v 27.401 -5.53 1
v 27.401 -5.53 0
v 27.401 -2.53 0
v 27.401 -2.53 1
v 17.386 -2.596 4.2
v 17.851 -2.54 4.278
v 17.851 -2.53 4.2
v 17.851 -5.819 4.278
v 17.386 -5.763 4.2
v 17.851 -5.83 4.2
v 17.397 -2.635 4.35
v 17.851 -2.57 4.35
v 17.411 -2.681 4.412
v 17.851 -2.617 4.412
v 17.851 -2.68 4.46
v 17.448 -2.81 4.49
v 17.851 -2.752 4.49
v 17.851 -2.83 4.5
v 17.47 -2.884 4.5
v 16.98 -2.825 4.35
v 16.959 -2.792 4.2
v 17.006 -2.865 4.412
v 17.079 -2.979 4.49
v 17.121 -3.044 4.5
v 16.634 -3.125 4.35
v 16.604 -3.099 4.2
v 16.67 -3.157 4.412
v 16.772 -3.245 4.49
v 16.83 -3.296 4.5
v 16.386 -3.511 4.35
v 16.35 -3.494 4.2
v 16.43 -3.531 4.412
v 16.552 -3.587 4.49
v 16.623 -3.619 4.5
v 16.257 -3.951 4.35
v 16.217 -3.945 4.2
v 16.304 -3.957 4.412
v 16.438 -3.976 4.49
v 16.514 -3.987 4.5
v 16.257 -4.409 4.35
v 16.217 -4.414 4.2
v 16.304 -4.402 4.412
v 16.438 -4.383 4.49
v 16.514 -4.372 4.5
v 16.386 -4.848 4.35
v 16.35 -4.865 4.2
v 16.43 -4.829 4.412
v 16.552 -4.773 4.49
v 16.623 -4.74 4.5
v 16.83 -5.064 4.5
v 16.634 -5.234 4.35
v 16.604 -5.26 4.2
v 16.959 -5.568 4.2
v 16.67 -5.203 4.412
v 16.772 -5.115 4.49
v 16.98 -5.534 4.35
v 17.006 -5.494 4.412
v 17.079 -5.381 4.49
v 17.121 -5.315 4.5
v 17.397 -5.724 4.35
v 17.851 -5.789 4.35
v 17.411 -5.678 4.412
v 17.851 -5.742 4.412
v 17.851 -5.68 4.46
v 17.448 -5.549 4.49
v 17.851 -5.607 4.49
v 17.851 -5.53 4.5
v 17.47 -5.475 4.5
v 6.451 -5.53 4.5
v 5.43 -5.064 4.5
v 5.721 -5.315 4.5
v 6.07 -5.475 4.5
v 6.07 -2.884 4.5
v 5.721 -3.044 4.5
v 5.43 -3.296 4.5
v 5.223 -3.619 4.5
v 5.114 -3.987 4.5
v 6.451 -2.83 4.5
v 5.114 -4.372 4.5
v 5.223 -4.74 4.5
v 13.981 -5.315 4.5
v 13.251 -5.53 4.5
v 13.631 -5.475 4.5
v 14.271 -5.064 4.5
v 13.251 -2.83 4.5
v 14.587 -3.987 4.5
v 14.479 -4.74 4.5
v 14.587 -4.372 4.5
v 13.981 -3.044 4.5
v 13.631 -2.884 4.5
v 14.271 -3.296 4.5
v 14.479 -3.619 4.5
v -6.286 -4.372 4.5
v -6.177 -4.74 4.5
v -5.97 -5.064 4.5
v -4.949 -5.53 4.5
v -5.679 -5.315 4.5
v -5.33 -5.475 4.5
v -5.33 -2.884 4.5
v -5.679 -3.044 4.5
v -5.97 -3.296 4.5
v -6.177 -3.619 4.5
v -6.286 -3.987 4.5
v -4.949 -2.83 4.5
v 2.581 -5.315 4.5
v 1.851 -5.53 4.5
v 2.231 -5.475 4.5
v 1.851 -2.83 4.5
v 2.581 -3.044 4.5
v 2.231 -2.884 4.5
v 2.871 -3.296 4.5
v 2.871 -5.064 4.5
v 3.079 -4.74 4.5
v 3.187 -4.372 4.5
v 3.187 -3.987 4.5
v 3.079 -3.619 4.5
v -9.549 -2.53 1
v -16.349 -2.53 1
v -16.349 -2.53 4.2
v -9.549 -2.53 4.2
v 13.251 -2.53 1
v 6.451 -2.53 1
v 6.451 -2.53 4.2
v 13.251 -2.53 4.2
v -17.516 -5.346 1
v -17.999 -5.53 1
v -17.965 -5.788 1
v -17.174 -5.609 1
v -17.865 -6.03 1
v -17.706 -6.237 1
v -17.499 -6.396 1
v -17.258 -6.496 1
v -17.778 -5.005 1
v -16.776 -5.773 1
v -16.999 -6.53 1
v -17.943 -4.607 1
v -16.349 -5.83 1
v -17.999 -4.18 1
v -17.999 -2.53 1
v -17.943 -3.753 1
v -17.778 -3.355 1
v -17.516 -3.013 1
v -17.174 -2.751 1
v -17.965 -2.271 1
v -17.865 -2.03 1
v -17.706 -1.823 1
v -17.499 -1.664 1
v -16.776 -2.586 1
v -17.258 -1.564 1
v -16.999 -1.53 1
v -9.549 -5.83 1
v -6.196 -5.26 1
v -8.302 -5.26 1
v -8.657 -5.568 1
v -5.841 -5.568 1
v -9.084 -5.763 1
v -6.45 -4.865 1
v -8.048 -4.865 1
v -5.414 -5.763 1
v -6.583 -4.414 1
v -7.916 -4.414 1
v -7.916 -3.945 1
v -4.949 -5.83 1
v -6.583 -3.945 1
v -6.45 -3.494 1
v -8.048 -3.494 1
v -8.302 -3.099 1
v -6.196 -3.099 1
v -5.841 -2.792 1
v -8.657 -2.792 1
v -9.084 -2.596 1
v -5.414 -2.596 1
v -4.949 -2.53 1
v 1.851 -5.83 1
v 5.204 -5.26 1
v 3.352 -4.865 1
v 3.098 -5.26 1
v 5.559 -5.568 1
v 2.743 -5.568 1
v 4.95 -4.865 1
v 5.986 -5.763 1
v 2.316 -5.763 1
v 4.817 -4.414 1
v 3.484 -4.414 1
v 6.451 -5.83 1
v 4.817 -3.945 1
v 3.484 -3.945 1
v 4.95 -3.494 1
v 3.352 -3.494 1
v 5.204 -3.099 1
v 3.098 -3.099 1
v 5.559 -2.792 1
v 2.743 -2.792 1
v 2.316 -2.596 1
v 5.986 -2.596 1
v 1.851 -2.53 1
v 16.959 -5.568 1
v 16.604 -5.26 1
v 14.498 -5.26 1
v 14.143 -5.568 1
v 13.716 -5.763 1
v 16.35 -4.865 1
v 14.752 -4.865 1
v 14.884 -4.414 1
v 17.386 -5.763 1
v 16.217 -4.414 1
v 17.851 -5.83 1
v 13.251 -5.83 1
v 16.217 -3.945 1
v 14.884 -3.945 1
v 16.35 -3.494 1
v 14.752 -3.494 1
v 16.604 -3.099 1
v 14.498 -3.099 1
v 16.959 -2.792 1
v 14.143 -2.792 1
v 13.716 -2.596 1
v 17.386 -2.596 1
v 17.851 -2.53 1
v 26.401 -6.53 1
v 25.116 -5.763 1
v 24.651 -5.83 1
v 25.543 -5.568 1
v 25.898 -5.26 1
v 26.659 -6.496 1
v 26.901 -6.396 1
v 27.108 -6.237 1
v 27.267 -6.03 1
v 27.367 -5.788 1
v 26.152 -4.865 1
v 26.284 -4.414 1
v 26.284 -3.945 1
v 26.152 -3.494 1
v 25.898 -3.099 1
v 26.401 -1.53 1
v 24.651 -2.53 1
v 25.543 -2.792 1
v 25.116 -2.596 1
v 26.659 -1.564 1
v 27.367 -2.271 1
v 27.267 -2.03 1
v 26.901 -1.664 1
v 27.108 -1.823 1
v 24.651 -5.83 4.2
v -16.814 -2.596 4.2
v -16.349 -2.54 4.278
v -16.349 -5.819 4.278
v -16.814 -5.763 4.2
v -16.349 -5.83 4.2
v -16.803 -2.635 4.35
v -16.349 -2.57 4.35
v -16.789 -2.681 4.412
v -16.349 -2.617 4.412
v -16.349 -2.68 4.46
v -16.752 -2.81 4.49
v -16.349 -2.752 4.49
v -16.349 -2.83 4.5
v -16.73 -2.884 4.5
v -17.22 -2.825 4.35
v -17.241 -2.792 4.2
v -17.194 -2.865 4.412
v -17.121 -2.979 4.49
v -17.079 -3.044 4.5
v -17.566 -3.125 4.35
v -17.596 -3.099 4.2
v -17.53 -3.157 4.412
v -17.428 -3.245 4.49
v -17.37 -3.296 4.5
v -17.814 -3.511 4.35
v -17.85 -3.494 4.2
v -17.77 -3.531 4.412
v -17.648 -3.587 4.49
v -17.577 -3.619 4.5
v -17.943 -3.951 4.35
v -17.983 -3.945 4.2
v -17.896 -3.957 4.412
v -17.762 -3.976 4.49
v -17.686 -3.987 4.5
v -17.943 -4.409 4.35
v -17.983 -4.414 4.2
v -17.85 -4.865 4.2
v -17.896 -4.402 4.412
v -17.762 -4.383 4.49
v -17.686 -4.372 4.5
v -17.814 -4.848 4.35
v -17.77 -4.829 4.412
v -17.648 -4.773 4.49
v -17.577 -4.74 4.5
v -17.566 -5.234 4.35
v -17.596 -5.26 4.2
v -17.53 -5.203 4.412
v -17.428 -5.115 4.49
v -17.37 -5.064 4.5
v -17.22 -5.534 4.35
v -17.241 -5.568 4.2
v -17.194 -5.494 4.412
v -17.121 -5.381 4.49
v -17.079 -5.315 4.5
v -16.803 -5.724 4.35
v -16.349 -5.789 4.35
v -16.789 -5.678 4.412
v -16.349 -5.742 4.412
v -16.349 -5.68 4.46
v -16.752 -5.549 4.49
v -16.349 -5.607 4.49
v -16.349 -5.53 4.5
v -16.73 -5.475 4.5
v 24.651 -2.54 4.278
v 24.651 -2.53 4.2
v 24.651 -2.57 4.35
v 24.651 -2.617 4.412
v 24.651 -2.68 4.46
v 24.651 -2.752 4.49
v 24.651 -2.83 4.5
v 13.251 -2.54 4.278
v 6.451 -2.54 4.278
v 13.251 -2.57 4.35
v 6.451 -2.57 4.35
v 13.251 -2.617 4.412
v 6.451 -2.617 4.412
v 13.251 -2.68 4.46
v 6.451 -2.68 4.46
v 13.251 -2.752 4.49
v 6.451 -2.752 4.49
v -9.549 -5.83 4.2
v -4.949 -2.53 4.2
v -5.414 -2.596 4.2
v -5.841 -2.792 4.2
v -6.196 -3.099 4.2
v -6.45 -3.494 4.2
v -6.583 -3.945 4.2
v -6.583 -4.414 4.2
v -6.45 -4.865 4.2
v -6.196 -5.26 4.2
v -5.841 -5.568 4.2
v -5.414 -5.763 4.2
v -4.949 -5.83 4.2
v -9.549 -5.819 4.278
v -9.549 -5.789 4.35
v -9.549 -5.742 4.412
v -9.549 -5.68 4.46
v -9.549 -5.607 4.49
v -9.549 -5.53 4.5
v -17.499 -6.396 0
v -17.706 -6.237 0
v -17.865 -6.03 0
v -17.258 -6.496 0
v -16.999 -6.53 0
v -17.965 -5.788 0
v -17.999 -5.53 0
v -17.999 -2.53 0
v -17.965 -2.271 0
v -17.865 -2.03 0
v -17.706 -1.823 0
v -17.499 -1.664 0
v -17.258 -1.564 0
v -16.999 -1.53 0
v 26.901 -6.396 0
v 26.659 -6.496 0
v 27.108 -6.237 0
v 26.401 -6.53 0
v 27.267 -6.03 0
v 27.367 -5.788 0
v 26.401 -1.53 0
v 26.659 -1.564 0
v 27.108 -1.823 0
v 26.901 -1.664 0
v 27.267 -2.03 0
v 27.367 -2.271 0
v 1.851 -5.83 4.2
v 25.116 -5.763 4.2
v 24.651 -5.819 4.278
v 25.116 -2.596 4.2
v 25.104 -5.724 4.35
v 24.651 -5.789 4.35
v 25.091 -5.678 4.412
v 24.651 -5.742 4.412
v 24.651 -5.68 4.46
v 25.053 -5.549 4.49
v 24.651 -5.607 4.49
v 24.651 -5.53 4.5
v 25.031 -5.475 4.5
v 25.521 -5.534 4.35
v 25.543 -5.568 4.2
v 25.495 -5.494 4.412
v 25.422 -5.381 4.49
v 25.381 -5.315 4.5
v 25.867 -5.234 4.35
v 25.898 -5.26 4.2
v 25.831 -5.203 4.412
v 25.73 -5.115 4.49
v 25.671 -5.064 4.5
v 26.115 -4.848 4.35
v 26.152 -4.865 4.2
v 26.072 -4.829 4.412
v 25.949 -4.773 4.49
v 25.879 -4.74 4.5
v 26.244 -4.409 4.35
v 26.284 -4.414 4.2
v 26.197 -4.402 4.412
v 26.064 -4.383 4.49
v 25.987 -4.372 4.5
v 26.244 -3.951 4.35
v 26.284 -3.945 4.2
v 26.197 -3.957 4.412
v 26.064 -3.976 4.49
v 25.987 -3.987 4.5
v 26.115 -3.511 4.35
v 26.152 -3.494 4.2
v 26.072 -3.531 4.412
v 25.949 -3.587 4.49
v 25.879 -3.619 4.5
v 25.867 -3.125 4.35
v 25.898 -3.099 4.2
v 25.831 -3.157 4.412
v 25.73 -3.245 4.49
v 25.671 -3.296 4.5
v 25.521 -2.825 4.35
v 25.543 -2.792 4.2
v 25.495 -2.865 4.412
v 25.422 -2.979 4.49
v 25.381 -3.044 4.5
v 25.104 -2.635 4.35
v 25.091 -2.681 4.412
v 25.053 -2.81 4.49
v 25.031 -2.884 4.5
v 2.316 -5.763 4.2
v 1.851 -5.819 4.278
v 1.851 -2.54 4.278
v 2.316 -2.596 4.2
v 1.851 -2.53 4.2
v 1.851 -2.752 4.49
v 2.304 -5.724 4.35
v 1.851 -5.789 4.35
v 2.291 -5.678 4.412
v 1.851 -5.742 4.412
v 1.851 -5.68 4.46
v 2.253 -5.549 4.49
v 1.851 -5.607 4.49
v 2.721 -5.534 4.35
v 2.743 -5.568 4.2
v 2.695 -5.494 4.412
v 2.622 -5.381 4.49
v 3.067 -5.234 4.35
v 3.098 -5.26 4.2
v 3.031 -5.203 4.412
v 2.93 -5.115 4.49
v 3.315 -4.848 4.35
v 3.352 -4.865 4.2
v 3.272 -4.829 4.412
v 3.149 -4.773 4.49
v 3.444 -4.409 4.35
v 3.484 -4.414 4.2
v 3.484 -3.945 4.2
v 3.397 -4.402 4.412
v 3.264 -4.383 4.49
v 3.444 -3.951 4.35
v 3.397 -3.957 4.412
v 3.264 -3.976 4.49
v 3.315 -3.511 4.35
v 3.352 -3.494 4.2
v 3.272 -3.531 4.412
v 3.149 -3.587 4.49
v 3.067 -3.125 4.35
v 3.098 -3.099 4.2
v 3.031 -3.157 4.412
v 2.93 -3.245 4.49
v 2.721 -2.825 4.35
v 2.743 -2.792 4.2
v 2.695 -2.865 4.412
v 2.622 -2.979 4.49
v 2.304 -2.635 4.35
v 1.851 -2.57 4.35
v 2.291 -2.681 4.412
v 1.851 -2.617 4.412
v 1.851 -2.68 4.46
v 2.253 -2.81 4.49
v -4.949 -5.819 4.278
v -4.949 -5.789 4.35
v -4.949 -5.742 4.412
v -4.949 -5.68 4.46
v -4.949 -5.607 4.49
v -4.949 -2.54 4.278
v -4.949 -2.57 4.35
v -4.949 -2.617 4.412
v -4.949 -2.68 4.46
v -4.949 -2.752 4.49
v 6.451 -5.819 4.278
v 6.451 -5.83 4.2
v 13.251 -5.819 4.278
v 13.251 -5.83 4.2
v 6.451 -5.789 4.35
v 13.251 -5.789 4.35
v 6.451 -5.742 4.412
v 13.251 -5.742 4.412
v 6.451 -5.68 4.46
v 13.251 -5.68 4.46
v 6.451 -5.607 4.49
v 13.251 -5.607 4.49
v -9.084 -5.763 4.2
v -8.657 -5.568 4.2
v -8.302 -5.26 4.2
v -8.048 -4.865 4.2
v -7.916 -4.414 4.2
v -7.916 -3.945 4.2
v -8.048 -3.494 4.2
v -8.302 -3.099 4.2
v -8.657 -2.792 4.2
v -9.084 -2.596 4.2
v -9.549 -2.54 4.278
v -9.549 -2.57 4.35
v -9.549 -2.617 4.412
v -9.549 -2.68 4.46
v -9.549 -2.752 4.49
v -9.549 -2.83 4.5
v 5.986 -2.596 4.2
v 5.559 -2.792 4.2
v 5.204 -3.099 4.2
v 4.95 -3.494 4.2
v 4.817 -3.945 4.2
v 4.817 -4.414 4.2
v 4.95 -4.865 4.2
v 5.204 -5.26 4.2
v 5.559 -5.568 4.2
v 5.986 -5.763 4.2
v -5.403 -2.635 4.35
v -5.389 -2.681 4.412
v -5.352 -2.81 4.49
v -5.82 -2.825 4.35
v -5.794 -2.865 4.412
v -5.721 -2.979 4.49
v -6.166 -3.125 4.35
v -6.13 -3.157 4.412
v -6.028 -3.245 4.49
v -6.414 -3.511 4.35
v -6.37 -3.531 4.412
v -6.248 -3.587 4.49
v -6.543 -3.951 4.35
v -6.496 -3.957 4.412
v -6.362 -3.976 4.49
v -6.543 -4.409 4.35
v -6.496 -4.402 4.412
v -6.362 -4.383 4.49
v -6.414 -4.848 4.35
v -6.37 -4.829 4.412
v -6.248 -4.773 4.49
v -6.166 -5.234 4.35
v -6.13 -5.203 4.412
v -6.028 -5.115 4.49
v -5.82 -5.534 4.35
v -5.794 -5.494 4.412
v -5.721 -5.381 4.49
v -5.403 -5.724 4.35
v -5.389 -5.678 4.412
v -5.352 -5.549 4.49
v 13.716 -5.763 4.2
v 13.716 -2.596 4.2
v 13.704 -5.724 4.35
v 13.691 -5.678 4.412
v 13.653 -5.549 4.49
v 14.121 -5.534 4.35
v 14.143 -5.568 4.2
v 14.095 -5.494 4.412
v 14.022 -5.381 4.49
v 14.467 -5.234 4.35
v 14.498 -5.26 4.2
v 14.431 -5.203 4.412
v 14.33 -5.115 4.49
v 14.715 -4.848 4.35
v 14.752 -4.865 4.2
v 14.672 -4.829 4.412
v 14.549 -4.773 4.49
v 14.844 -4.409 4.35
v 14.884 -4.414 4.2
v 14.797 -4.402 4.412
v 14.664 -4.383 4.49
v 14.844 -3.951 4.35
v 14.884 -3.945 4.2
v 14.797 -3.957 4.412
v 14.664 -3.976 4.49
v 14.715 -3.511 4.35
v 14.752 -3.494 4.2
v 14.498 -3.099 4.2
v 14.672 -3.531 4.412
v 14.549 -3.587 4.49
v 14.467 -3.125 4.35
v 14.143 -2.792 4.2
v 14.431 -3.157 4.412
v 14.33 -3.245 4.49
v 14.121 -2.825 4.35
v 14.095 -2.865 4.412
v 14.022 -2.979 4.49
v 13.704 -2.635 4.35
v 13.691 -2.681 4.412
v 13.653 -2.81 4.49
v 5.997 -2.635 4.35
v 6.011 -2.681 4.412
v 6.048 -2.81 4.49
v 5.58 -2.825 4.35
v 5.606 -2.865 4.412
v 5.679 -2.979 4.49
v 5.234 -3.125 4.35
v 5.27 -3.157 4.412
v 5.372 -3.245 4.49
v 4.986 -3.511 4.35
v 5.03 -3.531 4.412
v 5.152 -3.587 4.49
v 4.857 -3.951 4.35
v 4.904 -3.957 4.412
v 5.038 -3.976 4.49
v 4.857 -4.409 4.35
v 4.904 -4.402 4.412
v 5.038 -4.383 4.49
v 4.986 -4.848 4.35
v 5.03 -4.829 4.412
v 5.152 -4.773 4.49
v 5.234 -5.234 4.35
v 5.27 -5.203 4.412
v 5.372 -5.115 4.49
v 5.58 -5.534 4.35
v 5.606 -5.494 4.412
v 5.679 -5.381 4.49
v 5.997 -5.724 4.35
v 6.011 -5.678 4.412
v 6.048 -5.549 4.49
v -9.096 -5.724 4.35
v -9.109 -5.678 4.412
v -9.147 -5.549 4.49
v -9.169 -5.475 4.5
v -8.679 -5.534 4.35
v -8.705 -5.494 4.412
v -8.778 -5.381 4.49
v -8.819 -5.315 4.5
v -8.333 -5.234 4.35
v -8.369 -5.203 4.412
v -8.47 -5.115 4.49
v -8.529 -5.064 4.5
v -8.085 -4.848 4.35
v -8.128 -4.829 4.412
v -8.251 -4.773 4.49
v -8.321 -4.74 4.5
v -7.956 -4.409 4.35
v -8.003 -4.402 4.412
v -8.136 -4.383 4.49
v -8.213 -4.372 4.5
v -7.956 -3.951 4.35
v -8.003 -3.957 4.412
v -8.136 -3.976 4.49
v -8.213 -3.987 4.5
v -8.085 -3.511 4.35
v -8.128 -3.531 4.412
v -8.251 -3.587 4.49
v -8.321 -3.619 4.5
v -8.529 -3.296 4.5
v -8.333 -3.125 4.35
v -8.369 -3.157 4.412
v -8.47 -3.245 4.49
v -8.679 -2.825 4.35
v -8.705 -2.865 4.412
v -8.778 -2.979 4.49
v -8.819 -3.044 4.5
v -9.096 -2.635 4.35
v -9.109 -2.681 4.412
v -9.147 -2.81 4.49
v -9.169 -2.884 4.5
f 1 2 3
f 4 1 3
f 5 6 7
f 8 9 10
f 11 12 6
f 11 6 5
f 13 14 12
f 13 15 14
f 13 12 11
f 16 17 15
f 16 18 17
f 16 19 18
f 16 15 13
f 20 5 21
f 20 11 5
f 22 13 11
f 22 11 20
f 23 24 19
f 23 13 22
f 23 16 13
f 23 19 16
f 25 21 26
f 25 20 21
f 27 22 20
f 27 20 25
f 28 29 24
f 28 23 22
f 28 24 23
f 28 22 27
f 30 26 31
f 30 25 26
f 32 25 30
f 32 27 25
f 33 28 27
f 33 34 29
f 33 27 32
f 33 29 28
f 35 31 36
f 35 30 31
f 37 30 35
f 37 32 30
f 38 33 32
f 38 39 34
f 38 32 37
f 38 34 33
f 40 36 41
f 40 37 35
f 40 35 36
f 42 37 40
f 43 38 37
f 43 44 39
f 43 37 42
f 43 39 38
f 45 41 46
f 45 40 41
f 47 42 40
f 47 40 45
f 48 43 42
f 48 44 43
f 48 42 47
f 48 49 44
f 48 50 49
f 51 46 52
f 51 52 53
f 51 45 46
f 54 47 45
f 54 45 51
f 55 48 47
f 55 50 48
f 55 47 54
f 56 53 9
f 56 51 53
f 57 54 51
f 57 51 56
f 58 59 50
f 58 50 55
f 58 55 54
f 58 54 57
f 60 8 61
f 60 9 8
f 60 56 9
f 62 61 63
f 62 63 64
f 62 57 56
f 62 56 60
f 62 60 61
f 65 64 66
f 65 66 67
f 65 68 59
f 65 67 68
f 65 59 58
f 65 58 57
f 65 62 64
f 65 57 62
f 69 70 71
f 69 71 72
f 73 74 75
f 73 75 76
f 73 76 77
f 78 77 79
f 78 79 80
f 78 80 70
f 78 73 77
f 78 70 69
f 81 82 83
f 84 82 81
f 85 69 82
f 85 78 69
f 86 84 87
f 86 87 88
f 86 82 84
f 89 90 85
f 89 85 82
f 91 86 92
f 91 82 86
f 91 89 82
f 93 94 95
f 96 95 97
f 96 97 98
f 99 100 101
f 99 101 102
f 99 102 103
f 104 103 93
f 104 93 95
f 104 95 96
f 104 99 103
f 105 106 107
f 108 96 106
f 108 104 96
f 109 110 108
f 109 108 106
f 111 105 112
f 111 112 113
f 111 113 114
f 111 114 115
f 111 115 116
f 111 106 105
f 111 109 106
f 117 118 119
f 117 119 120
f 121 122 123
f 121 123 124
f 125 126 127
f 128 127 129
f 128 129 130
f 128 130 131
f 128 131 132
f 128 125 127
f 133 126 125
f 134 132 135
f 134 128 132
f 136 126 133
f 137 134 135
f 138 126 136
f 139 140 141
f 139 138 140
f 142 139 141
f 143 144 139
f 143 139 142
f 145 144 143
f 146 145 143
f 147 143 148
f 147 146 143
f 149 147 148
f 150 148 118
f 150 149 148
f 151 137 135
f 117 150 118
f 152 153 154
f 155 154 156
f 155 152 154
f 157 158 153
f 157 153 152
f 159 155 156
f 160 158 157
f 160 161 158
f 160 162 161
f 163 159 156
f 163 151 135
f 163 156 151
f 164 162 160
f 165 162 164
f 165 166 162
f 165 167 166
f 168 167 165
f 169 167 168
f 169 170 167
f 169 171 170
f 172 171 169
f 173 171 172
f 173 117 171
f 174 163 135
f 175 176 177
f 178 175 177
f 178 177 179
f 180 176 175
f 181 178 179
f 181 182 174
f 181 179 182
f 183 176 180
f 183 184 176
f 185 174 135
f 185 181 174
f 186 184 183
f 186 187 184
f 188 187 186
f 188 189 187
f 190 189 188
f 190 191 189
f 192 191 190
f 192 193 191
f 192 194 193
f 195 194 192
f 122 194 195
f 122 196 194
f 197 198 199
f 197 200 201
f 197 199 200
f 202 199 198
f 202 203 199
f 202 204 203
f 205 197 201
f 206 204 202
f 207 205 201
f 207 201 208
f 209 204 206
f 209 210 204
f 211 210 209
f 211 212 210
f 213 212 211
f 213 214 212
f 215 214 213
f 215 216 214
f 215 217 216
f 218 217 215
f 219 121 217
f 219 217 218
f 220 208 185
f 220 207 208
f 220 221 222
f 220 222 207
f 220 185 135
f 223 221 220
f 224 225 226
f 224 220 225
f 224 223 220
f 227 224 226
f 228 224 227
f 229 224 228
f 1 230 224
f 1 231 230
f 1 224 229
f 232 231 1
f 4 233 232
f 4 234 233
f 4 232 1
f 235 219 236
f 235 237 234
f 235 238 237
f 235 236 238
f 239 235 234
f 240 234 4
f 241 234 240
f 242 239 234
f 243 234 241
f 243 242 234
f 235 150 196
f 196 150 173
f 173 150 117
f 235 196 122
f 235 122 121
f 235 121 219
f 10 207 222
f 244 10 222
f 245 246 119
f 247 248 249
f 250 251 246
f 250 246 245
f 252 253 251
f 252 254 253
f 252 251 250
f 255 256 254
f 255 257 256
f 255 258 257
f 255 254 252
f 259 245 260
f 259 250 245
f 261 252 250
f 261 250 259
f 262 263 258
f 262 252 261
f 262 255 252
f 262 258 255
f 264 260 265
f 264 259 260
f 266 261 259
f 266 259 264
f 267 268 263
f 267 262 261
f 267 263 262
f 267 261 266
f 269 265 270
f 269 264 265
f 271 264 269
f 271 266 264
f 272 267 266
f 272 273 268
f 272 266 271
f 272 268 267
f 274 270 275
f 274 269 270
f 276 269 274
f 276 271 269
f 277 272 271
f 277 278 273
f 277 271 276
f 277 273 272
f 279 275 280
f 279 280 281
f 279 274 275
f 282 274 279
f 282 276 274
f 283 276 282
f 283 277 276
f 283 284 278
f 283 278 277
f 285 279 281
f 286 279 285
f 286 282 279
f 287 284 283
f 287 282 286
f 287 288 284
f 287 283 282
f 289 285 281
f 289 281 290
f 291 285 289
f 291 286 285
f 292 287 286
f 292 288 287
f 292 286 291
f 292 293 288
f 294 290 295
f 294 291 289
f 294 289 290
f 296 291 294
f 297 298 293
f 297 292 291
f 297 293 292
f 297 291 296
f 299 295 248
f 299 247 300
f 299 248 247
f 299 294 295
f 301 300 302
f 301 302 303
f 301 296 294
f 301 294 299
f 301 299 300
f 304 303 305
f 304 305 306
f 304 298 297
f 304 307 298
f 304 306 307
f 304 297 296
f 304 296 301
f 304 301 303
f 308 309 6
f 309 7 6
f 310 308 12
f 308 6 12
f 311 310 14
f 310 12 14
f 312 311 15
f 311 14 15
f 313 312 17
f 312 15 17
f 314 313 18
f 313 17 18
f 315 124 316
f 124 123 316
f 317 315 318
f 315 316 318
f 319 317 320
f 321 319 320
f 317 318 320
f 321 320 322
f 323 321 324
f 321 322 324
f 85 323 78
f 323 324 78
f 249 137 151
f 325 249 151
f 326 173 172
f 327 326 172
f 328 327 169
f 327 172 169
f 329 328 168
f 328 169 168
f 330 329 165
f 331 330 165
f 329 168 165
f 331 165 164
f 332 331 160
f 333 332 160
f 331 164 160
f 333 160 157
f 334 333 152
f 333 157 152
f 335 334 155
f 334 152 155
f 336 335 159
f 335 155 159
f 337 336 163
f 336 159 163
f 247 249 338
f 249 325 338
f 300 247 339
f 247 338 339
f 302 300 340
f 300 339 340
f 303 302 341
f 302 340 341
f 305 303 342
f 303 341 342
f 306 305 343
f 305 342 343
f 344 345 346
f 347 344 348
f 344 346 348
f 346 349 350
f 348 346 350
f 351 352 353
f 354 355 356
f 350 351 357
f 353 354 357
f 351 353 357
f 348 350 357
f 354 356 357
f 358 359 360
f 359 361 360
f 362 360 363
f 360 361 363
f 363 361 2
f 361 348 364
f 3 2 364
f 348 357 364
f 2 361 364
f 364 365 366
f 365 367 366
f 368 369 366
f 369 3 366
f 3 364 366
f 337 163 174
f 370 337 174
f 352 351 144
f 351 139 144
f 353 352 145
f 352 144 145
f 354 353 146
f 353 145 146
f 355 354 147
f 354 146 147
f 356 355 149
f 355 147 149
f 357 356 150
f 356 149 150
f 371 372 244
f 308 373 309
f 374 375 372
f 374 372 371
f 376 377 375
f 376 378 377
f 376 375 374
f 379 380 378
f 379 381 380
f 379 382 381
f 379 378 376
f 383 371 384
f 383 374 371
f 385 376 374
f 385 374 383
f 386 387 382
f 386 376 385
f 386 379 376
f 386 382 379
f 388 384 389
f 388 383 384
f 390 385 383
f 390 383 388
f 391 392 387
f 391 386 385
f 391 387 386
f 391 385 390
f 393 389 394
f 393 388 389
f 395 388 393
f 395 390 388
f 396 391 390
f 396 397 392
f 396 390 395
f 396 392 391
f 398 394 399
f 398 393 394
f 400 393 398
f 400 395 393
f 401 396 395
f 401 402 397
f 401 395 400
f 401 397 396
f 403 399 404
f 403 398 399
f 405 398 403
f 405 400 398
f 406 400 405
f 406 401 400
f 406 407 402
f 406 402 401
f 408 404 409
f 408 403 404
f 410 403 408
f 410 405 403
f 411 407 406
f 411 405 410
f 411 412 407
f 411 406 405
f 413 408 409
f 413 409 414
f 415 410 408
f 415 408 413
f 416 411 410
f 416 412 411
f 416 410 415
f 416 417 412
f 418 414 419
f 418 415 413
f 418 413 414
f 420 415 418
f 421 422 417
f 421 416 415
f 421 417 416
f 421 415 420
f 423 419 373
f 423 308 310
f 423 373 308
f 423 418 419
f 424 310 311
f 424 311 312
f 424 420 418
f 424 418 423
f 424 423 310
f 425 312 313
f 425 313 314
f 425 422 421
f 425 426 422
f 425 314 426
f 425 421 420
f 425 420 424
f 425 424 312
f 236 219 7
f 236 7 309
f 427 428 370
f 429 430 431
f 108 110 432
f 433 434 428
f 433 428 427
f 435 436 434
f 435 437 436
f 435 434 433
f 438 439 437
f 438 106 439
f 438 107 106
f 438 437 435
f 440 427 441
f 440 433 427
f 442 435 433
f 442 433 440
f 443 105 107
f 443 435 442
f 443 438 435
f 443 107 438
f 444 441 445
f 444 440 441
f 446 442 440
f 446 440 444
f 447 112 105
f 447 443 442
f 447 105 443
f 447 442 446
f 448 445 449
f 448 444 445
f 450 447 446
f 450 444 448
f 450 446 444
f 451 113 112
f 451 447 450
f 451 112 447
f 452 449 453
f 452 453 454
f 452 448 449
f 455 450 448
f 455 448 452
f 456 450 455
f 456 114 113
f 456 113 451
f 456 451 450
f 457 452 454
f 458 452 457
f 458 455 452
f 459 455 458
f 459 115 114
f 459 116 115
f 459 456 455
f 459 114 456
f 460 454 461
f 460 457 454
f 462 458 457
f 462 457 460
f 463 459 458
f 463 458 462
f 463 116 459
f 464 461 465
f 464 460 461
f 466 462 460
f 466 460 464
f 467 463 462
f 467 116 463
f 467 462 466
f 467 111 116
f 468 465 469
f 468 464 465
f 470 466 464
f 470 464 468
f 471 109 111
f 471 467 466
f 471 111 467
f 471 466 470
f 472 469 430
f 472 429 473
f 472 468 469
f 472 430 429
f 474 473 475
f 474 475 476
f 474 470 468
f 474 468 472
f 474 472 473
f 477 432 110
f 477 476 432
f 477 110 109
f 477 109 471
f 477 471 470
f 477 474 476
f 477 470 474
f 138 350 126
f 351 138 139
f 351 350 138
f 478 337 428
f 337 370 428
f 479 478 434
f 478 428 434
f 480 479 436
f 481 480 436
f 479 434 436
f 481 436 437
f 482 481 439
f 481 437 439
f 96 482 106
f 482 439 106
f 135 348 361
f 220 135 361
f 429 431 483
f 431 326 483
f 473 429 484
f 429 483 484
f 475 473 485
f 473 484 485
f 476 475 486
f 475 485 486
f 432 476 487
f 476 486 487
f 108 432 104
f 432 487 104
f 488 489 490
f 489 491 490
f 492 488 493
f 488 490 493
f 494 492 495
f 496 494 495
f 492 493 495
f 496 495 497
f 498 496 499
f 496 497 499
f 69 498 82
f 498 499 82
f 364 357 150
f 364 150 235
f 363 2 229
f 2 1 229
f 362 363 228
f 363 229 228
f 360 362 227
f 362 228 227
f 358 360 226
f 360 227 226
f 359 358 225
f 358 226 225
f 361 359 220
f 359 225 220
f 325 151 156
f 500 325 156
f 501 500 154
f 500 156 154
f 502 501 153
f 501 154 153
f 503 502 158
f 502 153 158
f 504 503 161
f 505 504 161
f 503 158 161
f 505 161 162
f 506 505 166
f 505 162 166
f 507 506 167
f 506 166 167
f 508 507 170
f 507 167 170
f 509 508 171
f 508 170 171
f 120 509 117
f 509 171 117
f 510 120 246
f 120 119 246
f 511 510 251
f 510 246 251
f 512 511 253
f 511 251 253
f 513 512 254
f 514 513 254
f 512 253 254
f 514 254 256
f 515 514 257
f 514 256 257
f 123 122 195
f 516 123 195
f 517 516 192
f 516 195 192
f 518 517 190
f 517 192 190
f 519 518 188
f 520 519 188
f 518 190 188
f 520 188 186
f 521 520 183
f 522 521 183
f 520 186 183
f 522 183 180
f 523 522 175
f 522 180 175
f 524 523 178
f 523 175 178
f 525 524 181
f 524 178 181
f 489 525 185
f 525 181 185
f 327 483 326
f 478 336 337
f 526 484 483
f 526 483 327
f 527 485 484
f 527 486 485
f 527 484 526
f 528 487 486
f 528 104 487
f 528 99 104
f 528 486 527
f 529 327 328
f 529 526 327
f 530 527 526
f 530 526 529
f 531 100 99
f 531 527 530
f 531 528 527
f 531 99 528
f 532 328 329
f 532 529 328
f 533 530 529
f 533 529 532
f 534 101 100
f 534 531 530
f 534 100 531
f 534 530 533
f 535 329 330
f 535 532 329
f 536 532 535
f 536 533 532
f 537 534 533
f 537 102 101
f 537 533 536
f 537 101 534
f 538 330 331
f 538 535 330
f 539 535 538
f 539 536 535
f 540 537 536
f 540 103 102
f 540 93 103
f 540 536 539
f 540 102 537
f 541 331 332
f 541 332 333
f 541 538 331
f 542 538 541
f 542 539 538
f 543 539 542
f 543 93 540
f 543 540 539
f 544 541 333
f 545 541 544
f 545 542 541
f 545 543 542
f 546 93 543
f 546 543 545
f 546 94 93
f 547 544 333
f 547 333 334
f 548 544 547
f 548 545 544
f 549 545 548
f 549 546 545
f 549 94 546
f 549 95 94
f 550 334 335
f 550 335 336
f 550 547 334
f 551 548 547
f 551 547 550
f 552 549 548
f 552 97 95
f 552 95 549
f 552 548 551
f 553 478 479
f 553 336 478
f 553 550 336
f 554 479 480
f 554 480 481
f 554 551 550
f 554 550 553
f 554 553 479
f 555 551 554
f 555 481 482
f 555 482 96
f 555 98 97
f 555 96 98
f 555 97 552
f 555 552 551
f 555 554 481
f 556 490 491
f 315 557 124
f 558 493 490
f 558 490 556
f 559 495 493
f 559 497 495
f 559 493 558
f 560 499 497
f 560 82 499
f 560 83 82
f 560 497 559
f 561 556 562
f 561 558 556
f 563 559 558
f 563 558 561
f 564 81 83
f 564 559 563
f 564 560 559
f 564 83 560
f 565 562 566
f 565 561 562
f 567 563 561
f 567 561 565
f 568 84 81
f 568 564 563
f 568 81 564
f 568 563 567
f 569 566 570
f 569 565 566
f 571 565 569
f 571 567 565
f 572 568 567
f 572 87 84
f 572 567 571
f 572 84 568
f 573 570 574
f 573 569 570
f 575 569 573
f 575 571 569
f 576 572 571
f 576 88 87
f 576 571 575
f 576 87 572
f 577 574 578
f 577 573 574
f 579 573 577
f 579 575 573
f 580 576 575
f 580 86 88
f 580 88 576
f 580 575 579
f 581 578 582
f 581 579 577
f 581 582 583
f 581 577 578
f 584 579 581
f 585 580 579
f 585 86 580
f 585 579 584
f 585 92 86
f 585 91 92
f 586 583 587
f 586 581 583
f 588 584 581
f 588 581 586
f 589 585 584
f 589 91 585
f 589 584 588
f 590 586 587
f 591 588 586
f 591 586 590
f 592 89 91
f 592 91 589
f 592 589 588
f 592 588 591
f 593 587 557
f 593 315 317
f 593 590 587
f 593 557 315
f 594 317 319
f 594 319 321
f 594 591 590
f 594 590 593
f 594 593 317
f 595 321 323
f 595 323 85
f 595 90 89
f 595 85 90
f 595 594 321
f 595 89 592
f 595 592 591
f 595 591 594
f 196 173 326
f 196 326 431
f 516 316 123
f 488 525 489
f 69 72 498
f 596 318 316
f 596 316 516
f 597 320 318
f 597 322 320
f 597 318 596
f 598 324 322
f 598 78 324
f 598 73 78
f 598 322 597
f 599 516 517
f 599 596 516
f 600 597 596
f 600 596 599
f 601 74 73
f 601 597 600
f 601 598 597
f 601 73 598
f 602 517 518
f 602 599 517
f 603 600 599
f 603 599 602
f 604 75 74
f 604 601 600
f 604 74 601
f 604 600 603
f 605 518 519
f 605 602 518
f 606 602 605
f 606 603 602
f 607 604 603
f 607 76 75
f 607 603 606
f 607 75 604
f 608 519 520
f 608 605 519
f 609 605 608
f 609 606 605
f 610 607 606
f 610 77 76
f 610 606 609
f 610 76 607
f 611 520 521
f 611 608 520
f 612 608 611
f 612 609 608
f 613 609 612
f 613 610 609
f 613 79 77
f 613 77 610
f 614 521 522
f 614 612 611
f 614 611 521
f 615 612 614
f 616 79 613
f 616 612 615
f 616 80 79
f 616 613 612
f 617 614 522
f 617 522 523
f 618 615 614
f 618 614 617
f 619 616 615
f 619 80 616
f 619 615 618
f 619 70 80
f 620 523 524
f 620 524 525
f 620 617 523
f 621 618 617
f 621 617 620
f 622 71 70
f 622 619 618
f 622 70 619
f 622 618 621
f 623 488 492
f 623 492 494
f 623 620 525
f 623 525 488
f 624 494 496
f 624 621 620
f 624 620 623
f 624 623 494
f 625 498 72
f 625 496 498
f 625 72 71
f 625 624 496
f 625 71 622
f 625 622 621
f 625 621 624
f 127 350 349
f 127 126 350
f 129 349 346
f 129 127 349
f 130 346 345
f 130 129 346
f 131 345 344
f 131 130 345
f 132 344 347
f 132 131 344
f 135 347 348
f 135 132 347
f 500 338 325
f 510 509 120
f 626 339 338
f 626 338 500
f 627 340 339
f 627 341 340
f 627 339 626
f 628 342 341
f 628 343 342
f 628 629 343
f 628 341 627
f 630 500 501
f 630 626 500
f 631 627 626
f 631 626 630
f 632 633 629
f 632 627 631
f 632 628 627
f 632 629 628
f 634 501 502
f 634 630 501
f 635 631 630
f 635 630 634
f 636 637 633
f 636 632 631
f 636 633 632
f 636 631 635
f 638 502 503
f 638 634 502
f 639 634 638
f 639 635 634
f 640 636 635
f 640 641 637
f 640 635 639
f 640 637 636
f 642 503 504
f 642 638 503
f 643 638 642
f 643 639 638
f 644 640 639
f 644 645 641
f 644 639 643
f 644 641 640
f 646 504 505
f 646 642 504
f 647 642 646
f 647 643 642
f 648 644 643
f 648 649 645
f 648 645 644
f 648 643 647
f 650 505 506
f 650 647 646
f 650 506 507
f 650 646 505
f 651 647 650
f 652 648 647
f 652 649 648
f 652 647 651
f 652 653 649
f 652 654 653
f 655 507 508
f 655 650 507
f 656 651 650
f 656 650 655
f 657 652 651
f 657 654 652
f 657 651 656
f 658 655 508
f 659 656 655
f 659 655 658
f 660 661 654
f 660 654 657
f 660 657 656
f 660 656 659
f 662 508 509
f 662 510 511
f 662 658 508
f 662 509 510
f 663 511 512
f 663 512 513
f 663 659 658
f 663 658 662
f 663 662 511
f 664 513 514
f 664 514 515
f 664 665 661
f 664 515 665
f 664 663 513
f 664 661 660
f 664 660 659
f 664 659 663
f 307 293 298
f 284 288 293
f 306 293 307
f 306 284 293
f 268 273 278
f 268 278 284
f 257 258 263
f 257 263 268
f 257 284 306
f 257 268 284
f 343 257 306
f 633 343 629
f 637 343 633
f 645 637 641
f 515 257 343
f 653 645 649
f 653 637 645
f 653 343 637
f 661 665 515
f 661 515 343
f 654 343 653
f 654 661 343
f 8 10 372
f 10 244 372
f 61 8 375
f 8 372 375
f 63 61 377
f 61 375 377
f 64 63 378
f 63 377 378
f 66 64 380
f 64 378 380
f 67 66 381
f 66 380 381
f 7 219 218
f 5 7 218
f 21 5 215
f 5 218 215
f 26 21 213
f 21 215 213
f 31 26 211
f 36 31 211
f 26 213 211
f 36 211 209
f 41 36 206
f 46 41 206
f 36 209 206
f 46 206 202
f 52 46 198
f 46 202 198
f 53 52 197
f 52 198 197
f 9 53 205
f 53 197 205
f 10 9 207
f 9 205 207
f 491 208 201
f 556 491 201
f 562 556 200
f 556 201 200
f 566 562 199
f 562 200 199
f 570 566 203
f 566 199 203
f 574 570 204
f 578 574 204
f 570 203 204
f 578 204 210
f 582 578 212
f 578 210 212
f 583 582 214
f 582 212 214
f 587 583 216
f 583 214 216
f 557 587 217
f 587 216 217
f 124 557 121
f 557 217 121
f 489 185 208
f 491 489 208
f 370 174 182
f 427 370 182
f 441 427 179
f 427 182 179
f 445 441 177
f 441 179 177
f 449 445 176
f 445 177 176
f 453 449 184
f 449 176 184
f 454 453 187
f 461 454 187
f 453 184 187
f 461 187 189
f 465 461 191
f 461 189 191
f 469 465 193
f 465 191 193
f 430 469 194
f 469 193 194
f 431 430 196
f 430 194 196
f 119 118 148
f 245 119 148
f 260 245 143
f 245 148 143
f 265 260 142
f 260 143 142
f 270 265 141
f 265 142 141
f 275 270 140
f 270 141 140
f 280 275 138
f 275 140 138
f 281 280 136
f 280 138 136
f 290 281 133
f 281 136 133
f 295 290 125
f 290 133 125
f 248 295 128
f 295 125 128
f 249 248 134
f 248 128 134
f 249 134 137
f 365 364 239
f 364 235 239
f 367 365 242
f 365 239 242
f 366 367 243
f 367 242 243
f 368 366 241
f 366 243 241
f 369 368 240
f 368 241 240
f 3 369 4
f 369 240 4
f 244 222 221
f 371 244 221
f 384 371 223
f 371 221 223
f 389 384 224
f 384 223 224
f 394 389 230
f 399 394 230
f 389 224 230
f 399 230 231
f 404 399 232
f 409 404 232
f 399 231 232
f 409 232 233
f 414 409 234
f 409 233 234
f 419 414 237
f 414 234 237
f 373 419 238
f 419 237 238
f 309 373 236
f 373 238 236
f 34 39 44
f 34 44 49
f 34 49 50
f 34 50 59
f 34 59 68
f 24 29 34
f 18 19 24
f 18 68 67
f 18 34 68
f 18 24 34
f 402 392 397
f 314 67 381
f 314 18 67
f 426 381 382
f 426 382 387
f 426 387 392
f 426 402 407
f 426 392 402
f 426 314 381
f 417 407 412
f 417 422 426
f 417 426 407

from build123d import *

# Parameters (mm, degrees)
F0_W     = 45.4
F0_H     = 5
F1_DEPTH = 1
F2_W     = 6.8
F2_H     = 3.3
F3_DEPTH = 3.5
F4_R     = 1
F5_R     = 0.3


with BuildPart() as f1:
    # F0 (on Top) → F1 (new body)
    with BuildSketch(Plane.XY):
        with Locations((4.700655, -4.029623)):
            Rectangle(F0_W, F0_H)
    extrude(amount=F1_DEPTH)

    # F2 (on face) → F3 (join)
    with BuildSketch(Plane.XY.offset(1)):
        with Locations((-12.949345, -4.179623)):
            Rectangle(F2_W, F2_H)
        with BuildLine():
            Line((-16.349345, -5.829623), (-16.349345, -2.529623))
            ThreePointArc((-16.349345, -2.529623), (-17.999345, -4.179623), (-16.349345, -5.829623))
        make_face()
        with BuildLine():
            ThreePointArc((-9.549345, -5.829623), (-7.899345, -4.179623), (-9.549345, -2.529623))
            Line((-9.549345, -2.529623), (-9.549345, -5.829623))
        make_face()
        with BuildLine():
            Line((-4.949345, -5.829623), (-4.949345, -2.529623))
            ThreePointArc((-4.949345, -2.529623), (-6.599345, -4.179623), (-4.949345, -5.829623))
        make_face()
        with Locations((-1.549345, -4.179623)):
            Rectangle(F2_W, F2_H)
        with BuildLine():
            ThreePointArc((1.850655, -5.829623), (3.500655, -4.179623), (1.850655, -2.529623))
            Line((1.850655, -2.529623), (1.850655, -5.829623))
        make_face()
        with BuildLine():
            Line((6.450655, -5.829623), (6.450655, -2.529623))
            ThreePointArc((6.450655, -2.529623), (4.800655, -4.179623), (6.450655, -5.829623))
        make_face()
        with Locations((9.850655, -4.179623)):
            Rectangle(F2_W, F2_H)
        with BuildLine():
            ThreePointArc((13.250655, -5.829623), (14.900655, -4.179623), (13.250655, -2.529623))
            Line((13.250655, -2.529623), (13.250655, -5.829623))
        make_face()
        with BuildLine():
            Line((17.850655, -5.829623), (17.850655, -2.529623))
            ThreePointArc((17.850655, -2.529623), (16.200655, -4.179623), (17.850655, -5.829623))
        make_face()
        with Locations((21.250655, -4.179623)):
            Rectangle(F2_W, F2_H)
        with BuildLine():
            ThreePointArc((24.650655, -5.829623), (26.300655, -4.179623), (24.650655, -2.529623))
            Line((24.650655, -2.529623), (24.650655, -5.829623))
        make_face()
    extrude(amount=F3_DEPTH)

    # F4
    f4_edges = [f1.edges().sort_by_distance(p)[0] for p in [
        (-17.999345, -1.529623, 0.5),
        (-17.999345, -6.529623, 0.5),
        (27.400655, -1.529623, 0.5),
        (27.400655, -6.529623, 0.5),
    ]]
    fillet(f4_edges, radius=F4_R)

    # F5
    f5_edges = [f1.edges().sort_by_distance(p)[0] for p in [
        (-17.999345, -4.179623, 4.5),
        (-6.599345, -4.179623, 4.5),
        (4.800655, -4.179623, 4.5),
        (16.200655, -4.179623, 4.5),
    ]]
    fillet(f5_edges, radius=F5_R)


solid = f1.part
